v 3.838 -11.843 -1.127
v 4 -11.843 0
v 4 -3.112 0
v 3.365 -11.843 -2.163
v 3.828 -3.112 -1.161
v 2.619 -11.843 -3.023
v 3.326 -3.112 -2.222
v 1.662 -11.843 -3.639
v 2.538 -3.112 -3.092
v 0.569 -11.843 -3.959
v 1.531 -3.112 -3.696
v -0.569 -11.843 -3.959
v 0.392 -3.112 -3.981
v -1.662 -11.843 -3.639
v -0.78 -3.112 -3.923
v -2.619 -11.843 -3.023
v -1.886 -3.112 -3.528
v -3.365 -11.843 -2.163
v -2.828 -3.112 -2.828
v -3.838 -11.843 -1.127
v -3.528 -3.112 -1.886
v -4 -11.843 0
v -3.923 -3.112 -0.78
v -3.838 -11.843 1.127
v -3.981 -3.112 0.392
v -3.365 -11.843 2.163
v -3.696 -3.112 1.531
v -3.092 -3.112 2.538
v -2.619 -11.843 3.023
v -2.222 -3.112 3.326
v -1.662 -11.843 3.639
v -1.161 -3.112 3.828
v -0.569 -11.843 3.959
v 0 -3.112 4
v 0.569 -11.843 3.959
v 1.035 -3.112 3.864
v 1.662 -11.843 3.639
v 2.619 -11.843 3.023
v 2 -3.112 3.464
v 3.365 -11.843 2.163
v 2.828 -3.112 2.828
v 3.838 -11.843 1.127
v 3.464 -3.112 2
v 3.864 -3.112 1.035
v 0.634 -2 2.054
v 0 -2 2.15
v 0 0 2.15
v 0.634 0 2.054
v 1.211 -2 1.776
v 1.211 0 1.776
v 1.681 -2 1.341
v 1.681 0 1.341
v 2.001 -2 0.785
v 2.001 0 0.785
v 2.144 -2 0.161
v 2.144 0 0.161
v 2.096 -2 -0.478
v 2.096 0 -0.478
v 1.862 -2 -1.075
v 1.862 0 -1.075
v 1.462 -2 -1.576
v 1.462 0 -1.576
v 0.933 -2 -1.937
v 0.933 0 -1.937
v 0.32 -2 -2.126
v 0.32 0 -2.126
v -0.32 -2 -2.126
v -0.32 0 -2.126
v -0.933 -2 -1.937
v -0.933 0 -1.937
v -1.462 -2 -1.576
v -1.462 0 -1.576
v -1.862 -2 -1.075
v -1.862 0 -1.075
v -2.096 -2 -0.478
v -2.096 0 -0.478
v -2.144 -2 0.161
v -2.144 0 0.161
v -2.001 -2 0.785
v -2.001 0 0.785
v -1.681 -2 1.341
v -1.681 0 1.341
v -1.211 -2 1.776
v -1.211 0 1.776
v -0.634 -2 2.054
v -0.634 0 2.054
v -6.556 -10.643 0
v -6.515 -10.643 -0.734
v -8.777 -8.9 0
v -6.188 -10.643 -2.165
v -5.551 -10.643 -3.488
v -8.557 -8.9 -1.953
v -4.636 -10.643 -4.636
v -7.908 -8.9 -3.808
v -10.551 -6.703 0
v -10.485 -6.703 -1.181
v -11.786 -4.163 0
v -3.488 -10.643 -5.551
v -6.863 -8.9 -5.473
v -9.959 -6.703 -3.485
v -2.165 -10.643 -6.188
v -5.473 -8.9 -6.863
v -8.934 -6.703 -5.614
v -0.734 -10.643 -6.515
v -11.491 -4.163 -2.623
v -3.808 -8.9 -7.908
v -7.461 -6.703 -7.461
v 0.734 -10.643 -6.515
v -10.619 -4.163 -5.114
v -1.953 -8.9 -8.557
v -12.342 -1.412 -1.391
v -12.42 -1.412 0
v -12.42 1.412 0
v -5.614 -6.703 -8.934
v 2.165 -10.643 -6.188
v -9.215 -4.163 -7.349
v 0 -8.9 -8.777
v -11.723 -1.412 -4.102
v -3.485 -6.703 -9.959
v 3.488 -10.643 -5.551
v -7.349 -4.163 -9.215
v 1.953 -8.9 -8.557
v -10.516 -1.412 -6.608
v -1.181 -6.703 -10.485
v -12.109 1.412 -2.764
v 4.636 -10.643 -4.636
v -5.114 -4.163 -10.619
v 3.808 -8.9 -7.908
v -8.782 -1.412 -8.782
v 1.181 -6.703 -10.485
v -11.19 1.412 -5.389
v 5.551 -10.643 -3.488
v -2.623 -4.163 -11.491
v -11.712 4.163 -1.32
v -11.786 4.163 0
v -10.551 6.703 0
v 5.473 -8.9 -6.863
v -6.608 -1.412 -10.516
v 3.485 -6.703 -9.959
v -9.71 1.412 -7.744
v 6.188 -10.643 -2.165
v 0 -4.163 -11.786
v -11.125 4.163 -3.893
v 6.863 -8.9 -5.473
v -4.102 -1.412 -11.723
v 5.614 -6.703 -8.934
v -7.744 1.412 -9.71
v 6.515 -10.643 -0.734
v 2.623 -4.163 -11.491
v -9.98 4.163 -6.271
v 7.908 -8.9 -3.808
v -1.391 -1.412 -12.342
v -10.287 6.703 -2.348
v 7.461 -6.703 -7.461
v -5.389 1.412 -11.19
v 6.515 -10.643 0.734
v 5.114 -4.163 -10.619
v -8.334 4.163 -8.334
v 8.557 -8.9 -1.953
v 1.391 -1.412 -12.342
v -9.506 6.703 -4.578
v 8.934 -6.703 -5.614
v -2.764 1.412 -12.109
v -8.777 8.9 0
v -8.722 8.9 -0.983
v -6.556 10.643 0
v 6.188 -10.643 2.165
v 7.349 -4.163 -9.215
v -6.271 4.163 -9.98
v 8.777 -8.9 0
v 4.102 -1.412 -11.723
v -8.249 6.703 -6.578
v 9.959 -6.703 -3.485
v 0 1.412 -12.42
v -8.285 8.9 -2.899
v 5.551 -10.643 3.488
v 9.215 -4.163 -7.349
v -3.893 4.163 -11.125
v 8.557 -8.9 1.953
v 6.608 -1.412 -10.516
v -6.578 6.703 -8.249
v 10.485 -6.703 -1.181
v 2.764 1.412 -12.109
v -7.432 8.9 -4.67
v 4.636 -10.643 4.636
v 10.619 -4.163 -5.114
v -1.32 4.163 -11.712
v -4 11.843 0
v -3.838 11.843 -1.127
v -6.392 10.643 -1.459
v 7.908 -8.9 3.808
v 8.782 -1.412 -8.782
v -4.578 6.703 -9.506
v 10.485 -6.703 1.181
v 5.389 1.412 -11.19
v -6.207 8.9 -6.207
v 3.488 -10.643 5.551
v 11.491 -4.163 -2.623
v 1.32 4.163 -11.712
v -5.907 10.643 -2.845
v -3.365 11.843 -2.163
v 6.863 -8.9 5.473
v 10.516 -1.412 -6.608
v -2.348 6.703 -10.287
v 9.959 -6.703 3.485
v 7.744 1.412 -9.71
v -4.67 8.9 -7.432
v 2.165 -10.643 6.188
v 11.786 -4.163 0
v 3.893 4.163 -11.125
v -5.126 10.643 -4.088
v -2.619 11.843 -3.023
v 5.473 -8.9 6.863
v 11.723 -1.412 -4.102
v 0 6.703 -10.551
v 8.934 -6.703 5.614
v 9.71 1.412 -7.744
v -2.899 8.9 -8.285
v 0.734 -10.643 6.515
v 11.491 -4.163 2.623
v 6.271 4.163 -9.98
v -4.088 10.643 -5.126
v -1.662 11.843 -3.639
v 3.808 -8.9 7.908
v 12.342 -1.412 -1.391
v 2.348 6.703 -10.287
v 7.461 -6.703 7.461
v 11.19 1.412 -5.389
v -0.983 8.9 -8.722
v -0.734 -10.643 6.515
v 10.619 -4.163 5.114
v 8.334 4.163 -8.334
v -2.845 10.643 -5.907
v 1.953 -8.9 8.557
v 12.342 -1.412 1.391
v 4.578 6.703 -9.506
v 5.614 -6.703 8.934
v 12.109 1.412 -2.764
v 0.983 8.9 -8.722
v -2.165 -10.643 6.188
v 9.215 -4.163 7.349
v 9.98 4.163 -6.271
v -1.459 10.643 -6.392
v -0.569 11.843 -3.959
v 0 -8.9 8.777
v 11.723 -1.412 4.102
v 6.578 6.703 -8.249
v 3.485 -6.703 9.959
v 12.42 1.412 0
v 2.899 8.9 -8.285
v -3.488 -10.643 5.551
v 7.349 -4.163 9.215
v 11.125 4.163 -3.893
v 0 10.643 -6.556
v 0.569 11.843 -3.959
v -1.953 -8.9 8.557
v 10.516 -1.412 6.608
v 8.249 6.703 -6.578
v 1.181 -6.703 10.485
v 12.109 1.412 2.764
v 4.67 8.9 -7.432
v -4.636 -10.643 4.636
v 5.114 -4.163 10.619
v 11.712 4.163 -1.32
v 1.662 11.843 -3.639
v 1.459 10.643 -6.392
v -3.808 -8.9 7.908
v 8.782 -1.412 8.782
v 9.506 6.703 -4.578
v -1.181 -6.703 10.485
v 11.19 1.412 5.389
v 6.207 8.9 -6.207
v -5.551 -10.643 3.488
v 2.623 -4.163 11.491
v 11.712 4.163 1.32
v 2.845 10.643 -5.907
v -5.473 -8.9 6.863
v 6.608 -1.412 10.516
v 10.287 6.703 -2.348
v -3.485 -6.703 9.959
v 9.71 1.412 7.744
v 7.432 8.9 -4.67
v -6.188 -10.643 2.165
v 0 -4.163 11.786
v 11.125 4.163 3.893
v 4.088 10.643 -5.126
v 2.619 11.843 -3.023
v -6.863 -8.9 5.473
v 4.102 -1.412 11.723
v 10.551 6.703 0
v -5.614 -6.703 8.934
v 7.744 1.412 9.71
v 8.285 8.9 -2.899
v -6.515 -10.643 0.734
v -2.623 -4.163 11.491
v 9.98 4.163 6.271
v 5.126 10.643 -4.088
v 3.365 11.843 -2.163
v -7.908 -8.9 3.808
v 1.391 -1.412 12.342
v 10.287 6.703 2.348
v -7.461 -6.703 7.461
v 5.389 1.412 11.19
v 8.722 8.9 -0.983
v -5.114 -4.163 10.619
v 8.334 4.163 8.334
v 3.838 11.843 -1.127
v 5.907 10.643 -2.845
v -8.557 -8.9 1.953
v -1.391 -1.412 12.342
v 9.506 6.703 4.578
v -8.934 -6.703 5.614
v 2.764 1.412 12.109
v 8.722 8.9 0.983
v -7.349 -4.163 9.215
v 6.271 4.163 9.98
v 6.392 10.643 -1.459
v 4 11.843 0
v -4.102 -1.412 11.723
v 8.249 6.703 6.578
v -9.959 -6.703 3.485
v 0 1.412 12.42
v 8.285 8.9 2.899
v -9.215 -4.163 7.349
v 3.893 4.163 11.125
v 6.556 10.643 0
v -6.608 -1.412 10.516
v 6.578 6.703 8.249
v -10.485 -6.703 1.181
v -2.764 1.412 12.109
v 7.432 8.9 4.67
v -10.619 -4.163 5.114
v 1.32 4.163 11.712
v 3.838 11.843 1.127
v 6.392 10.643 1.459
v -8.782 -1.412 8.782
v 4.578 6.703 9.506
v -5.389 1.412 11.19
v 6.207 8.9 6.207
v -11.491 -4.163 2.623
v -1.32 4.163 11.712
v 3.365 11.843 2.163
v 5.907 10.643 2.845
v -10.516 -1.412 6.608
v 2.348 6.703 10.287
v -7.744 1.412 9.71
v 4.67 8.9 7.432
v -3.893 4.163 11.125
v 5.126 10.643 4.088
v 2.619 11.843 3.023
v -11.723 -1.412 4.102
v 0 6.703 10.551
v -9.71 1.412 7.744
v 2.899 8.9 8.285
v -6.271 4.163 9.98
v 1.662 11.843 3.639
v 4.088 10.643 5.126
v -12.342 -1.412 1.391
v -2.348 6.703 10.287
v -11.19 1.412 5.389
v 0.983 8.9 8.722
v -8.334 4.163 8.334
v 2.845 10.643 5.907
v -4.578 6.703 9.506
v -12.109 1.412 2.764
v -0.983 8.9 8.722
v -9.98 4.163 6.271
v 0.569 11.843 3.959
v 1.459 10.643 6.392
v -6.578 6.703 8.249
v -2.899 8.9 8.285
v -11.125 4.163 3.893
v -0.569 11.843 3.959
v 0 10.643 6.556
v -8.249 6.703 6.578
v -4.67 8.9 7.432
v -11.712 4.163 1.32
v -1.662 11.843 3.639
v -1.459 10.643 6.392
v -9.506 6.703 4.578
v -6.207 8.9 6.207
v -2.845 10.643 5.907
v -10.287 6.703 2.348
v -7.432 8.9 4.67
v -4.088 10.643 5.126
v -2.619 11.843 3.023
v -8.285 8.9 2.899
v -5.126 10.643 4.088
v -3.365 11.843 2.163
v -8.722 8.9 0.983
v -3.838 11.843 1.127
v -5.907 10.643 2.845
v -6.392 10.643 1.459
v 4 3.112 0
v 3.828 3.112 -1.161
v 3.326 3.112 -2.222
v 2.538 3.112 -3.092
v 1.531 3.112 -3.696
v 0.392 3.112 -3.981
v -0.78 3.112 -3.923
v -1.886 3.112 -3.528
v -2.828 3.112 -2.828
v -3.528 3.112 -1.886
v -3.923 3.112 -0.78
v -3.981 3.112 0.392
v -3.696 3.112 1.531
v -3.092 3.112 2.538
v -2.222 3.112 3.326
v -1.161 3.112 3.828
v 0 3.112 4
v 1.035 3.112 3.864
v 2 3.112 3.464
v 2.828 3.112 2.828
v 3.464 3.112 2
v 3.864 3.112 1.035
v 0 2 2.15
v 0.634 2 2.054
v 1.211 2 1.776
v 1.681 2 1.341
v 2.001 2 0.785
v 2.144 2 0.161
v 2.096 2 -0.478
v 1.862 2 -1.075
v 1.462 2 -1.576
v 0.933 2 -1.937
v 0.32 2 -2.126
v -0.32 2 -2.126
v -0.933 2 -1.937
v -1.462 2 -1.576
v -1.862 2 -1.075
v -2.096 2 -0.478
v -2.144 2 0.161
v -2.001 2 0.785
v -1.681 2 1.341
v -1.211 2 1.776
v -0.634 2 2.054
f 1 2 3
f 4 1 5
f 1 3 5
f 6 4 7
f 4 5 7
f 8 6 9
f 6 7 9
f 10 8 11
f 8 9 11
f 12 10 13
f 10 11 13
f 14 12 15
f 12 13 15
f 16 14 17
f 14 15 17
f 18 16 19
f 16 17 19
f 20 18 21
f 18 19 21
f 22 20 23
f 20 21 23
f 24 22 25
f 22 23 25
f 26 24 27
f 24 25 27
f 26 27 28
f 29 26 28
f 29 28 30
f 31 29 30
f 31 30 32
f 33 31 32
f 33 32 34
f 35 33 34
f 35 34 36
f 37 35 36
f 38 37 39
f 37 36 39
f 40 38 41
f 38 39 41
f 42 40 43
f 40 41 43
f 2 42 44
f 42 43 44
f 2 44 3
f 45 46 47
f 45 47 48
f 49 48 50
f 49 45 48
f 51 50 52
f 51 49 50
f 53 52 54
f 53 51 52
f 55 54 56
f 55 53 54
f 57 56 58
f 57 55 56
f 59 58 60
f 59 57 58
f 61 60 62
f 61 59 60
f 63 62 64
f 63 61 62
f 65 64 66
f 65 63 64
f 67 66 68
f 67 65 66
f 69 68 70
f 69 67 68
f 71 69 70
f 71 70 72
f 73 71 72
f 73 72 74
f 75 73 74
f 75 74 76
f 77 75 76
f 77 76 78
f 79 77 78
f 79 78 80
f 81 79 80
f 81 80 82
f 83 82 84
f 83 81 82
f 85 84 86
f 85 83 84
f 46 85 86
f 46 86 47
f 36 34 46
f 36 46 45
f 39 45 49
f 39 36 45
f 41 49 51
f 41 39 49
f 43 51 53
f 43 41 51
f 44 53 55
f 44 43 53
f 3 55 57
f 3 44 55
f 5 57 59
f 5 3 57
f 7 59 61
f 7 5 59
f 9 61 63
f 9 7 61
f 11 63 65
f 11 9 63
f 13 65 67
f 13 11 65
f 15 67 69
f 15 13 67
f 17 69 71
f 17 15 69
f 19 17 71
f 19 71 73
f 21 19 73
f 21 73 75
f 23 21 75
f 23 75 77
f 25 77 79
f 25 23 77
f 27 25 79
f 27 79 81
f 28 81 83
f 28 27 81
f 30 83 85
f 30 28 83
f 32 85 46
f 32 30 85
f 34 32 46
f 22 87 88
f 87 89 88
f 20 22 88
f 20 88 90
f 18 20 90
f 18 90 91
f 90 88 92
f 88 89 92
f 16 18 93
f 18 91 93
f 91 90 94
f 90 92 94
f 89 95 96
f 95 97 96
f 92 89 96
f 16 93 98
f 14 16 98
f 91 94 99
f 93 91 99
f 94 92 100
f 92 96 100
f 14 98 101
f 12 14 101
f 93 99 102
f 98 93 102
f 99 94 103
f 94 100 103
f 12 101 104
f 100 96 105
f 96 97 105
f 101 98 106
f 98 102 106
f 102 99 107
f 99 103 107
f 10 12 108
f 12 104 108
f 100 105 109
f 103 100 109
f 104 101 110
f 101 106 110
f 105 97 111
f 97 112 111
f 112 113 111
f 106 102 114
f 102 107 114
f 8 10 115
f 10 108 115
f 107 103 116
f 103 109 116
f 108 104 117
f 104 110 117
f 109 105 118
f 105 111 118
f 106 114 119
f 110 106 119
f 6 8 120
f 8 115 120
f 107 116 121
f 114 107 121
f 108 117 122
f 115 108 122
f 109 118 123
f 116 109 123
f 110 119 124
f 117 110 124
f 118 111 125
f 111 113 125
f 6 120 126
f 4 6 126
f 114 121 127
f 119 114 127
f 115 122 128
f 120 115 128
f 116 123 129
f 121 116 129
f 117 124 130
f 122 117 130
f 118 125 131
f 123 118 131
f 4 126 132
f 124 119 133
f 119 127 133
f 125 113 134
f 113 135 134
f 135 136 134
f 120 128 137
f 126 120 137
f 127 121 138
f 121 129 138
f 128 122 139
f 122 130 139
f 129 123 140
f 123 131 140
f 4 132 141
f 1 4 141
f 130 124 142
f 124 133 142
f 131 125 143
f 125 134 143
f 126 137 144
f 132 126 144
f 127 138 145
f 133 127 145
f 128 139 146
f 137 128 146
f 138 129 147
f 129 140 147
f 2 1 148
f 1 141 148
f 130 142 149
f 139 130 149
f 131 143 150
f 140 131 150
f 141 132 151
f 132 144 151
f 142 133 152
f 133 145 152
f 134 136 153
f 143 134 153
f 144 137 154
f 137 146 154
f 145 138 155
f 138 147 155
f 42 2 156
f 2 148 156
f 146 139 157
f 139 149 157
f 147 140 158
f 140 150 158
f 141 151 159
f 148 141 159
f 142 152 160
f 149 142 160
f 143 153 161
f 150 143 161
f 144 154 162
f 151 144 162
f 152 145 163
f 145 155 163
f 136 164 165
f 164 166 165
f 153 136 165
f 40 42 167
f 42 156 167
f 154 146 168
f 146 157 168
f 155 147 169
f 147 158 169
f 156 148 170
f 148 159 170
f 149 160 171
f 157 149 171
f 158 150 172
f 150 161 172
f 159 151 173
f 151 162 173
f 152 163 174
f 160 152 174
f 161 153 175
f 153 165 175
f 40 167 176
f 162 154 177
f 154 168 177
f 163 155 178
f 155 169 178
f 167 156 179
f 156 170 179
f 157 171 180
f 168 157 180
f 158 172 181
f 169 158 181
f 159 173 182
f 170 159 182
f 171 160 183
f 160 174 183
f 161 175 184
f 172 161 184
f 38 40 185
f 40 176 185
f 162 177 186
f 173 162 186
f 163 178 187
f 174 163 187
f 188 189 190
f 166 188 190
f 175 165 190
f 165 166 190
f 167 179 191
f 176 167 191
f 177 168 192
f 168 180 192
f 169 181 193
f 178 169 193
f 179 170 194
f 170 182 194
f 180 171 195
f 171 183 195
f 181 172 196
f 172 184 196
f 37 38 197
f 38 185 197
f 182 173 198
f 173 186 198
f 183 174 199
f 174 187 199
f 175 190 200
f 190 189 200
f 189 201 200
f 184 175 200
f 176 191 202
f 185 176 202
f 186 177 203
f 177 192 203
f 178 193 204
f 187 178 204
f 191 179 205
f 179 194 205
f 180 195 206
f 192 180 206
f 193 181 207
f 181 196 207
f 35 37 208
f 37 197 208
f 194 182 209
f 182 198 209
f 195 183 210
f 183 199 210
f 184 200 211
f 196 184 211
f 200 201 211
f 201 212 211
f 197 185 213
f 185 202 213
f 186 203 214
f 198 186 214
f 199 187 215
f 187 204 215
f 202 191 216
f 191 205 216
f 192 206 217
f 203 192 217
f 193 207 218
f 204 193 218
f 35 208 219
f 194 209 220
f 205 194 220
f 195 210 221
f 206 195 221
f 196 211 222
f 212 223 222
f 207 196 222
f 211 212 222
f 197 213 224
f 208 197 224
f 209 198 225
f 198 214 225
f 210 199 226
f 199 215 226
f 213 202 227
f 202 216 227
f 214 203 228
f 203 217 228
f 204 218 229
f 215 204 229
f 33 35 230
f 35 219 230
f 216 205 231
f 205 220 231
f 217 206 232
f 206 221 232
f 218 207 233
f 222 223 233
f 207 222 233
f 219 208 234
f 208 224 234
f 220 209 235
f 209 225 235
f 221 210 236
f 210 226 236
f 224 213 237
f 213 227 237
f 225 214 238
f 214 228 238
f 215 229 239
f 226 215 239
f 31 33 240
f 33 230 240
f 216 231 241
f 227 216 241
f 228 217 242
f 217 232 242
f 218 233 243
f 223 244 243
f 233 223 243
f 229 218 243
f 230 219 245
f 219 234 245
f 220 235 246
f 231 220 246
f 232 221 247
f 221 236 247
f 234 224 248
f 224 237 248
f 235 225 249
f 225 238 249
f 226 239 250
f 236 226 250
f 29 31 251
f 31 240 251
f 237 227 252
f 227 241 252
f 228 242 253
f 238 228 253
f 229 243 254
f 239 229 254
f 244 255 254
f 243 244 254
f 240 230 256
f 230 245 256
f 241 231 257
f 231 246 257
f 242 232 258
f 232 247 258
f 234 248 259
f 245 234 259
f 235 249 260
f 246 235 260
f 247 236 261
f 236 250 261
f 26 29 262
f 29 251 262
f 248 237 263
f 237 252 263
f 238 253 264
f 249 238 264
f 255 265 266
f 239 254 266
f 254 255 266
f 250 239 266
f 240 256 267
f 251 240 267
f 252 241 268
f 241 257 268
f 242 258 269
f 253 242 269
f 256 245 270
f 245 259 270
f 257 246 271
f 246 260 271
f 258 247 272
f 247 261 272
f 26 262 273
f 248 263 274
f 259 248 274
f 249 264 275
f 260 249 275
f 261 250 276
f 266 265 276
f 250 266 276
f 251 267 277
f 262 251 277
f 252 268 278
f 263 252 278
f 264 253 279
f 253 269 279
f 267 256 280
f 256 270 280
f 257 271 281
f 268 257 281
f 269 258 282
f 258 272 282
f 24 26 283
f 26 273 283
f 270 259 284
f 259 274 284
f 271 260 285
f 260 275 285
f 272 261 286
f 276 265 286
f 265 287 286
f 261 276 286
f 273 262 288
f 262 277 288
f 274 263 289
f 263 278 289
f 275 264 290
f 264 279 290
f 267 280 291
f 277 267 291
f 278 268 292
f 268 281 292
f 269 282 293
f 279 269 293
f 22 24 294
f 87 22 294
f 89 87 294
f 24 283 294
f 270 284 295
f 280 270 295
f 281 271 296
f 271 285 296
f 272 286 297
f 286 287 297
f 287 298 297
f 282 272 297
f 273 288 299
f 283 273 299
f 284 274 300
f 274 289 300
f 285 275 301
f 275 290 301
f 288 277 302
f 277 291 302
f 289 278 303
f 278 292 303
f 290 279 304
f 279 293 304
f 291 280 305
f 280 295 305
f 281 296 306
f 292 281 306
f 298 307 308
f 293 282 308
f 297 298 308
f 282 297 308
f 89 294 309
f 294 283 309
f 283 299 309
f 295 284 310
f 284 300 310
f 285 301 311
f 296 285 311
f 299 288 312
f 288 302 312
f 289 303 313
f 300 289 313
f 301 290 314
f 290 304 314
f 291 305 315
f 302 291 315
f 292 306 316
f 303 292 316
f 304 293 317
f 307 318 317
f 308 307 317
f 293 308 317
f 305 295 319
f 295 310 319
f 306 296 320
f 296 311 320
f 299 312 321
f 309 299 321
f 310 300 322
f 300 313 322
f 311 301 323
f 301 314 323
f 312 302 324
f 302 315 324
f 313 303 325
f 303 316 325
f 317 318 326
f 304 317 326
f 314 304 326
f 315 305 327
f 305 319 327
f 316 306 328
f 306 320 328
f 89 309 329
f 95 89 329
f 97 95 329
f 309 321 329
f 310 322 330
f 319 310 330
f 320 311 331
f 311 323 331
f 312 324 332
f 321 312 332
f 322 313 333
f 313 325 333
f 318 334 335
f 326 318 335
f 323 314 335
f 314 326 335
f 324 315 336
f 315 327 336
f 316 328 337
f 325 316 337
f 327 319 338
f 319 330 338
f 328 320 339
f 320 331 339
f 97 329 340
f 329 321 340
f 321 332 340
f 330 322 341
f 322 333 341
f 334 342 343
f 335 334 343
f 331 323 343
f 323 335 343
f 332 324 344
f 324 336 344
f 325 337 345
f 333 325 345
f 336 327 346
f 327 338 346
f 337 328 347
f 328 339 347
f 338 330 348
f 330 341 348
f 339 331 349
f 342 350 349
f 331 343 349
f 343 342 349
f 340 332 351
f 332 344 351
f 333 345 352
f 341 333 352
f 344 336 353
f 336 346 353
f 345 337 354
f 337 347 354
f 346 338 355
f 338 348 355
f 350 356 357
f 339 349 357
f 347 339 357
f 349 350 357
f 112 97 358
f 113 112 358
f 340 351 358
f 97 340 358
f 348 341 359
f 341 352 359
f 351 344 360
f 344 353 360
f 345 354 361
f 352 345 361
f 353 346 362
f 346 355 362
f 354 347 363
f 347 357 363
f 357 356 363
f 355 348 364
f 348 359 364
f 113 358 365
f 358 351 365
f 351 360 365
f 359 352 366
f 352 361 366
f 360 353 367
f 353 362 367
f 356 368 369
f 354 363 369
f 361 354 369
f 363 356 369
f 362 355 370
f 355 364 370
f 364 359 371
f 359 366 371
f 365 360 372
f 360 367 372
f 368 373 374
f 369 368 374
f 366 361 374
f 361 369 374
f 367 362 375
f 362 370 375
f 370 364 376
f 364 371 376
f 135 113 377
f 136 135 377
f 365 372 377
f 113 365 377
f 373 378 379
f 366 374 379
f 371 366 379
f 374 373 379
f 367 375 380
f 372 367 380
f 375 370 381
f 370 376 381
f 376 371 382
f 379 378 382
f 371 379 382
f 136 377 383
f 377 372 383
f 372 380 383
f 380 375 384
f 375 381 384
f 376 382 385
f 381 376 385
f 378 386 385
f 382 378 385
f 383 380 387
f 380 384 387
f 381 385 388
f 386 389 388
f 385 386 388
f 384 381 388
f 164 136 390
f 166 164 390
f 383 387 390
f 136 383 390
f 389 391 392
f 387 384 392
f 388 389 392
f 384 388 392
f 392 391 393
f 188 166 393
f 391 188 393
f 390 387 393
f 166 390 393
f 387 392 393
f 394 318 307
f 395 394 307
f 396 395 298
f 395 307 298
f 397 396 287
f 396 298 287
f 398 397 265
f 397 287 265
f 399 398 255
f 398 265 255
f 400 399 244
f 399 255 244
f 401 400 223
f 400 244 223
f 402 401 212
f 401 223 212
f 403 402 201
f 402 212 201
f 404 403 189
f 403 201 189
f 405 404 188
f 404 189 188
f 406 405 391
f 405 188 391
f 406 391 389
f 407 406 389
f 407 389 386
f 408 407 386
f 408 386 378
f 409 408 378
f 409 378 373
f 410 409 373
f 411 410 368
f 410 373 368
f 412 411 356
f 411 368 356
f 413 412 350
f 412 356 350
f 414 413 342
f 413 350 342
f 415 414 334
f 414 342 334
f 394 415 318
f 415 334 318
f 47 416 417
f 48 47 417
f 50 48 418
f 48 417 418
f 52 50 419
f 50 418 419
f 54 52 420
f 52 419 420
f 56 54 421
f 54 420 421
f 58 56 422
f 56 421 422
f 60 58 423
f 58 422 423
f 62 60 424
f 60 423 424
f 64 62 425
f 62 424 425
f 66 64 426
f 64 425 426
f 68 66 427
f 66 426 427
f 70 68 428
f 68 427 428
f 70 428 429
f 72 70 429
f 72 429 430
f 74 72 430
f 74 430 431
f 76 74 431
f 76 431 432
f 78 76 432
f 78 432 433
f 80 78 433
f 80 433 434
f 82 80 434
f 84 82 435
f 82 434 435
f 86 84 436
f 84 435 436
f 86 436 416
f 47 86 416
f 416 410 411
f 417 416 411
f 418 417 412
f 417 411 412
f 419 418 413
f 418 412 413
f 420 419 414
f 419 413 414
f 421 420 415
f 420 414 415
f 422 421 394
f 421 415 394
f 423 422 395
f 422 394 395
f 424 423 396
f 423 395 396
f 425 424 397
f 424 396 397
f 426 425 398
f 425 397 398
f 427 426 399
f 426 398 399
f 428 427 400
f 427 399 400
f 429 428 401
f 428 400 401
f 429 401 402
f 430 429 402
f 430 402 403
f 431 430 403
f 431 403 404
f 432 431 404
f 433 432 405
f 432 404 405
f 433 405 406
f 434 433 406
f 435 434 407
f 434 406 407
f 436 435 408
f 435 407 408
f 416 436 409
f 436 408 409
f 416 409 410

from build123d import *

# Parameters (mm, degrees)
SKIZZE3_R                       = 4
SCHNITT_LINEAR_AUSTRAGEN1_DEPTH = 20


with BuildPart() as part:
    # Skizze1 → Rotation1 (revolve)
    with BuildSketch(Plane.XY):
        with BuildLine():
            Line((0, 12.5), (0, -12.5))
            ThreePointArc((0, -12.5), (-12.5, 0), (0, 12.5))
        make_face()
    revolve(axis=Axis((0, 27.42628623, 0), (0, -1, 0)))

    # Skizze3 → Schnitt-Linear austragen1 (cut, symmetric)
    with BuildSketch(Plane(origin=(0, 0, 0), x_dir=(1, 0, 0), z_dir=(0, 1, 0))):
        Circle(SKIZZE3_R)
    extrude(amount=SCHNITT_LINEAR_AUSTRAGEN1_DEPTH, both=True, mode=Mode.SUBTRACT)

    # Skizze5 → Rotation2 (revolve)
    with BuildSketch(Plane(origin=(0, 0, 0), x_dir=(0, 0, -1), z_dir=(1, 0, 0))):
        Polygon((-2.15, 0), (-2.15, 2), (-5, 3.712452764), (-5, 0), align=None)
    rotation2 = revolve(axis=Axis((0, 0, 0), (0, 1, 0)))

    # Spiegeln1: Rotation2 across plane
    add(rotation2.mirror(Plane.ZX))


solid = part.part
